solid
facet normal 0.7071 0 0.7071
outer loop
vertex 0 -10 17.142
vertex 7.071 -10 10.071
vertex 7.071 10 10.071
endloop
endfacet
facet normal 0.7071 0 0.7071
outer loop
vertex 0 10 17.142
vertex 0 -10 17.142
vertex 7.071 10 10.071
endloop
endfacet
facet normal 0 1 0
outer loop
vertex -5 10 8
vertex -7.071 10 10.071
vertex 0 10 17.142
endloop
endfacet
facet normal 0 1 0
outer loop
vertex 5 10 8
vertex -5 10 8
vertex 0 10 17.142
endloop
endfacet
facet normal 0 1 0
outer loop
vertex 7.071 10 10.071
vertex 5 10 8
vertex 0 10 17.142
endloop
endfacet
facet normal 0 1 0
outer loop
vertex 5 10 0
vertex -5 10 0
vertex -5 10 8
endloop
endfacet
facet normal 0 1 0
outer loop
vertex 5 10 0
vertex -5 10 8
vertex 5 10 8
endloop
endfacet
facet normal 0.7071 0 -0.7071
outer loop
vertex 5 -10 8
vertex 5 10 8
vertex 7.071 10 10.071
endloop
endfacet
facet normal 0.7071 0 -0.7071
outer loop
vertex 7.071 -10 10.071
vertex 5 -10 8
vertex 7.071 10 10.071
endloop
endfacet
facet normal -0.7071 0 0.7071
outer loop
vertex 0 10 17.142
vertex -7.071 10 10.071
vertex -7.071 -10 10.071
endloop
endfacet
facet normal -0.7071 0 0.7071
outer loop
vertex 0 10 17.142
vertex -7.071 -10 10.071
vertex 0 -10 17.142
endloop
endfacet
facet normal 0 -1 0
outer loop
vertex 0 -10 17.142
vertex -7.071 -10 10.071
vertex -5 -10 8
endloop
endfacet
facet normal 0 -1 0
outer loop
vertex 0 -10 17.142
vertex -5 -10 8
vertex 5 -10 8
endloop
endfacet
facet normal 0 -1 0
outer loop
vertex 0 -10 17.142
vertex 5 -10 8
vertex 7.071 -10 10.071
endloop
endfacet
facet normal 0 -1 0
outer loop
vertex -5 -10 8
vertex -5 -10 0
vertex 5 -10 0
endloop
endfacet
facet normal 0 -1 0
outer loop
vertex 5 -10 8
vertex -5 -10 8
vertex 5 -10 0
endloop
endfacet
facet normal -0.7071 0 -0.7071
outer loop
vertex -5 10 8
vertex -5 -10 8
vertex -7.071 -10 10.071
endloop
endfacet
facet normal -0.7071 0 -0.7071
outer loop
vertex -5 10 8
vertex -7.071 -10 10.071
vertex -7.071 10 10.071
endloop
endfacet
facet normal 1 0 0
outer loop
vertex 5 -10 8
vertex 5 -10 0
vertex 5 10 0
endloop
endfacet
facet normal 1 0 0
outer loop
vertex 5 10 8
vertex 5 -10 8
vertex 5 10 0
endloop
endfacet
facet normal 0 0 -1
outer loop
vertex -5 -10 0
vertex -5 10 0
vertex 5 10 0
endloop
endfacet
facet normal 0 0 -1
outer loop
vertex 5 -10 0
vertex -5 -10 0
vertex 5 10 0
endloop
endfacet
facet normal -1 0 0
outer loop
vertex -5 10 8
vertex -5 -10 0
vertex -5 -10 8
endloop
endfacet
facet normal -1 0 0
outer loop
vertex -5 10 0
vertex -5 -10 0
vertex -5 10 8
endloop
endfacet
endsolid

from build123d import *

# Parameters (mm, degrees)
BOX001_W               = 10
BOX001_H               = 20
BOX001_DEPTH           = 10
BOX001_PLACEMENT_ANGLE = 315
BOX_W                  = 10
BOX_H                  = 20
BOX_DEPTH              = 10


with BuildPart() as cubo001:
    # Box001 → Box001 (new body)
    with BuildSketch(Plane.XY):
        with Locations((5, 10)):
            Rectangle(BOX001_W, BOX001_H)
    extrude(amount=BOX001_DEPTH)


with BuildPart() as cubo001_1:
    # Box001 placement: moved
    add(cubo001.part.moved(Location((0, -10, 3))).rotate(Axis((0, -10, 3), (0, 1, 0)), BOX001_PLACEMENT_ANGLE))


with BuildPart() as fusion:
    # Box → Box (new body)
    with BuildSketch(Plane(origin=(-5, -10, 0), x_dir=(1, 0, 0), z_dir=(0, 0, 1))):
        with Locations((5, 10)):
            Rectangle(BOX_W, BOX_H)
    extrude(amount=BOX_DEPTH)

    # Fusion: union Cubo001
    add(cubo001_1.part)


solid = fusion.part
